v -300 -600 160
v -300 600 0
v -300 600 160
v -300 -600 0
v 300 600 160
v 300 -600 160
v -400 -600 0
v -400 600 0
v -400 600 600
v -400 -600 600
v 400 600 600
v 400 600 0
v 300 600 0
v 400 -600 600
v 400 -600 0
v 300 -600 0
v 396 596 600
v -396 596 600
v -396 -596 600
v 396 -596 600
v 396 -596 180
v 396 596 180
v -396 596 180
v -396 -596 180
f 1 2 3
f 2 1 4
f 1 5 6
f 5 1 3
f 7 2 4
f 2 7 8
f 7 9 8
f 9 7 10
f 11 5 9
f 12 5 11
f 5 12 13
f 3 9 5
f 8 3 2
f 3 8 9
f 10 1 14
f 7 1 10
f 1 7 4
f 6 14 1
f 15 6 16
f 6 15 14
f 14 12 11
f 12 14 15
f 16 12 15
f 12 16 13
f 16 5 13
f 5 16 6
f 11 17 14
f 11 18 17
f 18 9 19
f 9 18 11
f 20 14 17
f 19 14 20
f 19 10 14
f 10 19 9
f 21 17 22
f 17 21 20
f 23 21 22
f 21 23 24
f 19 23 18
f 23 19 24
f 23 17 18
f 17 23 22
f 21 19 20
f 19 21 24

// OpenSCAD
// Crate 1200 x 800 x 600 (box pallet) - generated by asrs_3d.py from out/design_result.json (F3) - units mm
// DESIGN - to be checked and released by the responsible engineer. Coordinates: x along aisle, y across, z up.

bays = 19;
levels = 10;
bay = 1925;
L_rack = 36675;
H_rack = 12600;
W_rack = 4100;
clear_beam = 1825;
z1 = 450;
pitch = 1250;
up_w = 100;
up_d = 80;
gap = 75;
aisle = 1500;
x0 = 1200;
y_face = 750;
y_rear = 2050;
y_crate_c = 1400;
cL = 1200;
cW = 800;
cH = 600;
c_leg = 160;
beam_h = 120;
beam_b = 50;
mast_h = 600;
mast_b = 400;
mast_t = 6;
H_mast = 13100;
wheel_D = 400;
wheelbase = 2400;
stroke = 1350;
drum_D = 315;
conv_top = 700;
fork_len = 1300;
rail_top_z0 = 13130;
rail_top_z1 = 13250;
tie_z0 = 13250;
tie_z1 = 13350;
fork_w = [450, 400, 350];  fork_t = [60, 45, 35];
function lz(l) = z1 + (l - 1) * pitch;     // beam top of level l
function cx(b, k) = x0 + b * bay + up_w + gap + cW / 2 + k * (cW + gap);
module box(a, b) { translate(a) cube([b[0]-a[0], b[1]-a[1], b[2]-a[2]]); }
module brace(a, b, w=40) { hull() { translate(a - [w/2, w/2, w/2]) cube(w); translate(b - [w/2, w/2, w/2]) cube(w); } }

module crate() {
  lw = 100;   // runner width (F4.2 crate base: 2 runners along the 1200 side)
  for (sx = [-1, 1]) translate([sx * (cW/2 - lw/2) - lw/2, -cL/2, 0]) cube([lw, cL, c_leg]);
  translate([-cW/2, -cL/2, c_leg]) difference() { cube([cW, cL, cH - c_leg]); translate([4, 4, 20]) cube([cW - 8, cL - 8, cH]); }
}
crate();
